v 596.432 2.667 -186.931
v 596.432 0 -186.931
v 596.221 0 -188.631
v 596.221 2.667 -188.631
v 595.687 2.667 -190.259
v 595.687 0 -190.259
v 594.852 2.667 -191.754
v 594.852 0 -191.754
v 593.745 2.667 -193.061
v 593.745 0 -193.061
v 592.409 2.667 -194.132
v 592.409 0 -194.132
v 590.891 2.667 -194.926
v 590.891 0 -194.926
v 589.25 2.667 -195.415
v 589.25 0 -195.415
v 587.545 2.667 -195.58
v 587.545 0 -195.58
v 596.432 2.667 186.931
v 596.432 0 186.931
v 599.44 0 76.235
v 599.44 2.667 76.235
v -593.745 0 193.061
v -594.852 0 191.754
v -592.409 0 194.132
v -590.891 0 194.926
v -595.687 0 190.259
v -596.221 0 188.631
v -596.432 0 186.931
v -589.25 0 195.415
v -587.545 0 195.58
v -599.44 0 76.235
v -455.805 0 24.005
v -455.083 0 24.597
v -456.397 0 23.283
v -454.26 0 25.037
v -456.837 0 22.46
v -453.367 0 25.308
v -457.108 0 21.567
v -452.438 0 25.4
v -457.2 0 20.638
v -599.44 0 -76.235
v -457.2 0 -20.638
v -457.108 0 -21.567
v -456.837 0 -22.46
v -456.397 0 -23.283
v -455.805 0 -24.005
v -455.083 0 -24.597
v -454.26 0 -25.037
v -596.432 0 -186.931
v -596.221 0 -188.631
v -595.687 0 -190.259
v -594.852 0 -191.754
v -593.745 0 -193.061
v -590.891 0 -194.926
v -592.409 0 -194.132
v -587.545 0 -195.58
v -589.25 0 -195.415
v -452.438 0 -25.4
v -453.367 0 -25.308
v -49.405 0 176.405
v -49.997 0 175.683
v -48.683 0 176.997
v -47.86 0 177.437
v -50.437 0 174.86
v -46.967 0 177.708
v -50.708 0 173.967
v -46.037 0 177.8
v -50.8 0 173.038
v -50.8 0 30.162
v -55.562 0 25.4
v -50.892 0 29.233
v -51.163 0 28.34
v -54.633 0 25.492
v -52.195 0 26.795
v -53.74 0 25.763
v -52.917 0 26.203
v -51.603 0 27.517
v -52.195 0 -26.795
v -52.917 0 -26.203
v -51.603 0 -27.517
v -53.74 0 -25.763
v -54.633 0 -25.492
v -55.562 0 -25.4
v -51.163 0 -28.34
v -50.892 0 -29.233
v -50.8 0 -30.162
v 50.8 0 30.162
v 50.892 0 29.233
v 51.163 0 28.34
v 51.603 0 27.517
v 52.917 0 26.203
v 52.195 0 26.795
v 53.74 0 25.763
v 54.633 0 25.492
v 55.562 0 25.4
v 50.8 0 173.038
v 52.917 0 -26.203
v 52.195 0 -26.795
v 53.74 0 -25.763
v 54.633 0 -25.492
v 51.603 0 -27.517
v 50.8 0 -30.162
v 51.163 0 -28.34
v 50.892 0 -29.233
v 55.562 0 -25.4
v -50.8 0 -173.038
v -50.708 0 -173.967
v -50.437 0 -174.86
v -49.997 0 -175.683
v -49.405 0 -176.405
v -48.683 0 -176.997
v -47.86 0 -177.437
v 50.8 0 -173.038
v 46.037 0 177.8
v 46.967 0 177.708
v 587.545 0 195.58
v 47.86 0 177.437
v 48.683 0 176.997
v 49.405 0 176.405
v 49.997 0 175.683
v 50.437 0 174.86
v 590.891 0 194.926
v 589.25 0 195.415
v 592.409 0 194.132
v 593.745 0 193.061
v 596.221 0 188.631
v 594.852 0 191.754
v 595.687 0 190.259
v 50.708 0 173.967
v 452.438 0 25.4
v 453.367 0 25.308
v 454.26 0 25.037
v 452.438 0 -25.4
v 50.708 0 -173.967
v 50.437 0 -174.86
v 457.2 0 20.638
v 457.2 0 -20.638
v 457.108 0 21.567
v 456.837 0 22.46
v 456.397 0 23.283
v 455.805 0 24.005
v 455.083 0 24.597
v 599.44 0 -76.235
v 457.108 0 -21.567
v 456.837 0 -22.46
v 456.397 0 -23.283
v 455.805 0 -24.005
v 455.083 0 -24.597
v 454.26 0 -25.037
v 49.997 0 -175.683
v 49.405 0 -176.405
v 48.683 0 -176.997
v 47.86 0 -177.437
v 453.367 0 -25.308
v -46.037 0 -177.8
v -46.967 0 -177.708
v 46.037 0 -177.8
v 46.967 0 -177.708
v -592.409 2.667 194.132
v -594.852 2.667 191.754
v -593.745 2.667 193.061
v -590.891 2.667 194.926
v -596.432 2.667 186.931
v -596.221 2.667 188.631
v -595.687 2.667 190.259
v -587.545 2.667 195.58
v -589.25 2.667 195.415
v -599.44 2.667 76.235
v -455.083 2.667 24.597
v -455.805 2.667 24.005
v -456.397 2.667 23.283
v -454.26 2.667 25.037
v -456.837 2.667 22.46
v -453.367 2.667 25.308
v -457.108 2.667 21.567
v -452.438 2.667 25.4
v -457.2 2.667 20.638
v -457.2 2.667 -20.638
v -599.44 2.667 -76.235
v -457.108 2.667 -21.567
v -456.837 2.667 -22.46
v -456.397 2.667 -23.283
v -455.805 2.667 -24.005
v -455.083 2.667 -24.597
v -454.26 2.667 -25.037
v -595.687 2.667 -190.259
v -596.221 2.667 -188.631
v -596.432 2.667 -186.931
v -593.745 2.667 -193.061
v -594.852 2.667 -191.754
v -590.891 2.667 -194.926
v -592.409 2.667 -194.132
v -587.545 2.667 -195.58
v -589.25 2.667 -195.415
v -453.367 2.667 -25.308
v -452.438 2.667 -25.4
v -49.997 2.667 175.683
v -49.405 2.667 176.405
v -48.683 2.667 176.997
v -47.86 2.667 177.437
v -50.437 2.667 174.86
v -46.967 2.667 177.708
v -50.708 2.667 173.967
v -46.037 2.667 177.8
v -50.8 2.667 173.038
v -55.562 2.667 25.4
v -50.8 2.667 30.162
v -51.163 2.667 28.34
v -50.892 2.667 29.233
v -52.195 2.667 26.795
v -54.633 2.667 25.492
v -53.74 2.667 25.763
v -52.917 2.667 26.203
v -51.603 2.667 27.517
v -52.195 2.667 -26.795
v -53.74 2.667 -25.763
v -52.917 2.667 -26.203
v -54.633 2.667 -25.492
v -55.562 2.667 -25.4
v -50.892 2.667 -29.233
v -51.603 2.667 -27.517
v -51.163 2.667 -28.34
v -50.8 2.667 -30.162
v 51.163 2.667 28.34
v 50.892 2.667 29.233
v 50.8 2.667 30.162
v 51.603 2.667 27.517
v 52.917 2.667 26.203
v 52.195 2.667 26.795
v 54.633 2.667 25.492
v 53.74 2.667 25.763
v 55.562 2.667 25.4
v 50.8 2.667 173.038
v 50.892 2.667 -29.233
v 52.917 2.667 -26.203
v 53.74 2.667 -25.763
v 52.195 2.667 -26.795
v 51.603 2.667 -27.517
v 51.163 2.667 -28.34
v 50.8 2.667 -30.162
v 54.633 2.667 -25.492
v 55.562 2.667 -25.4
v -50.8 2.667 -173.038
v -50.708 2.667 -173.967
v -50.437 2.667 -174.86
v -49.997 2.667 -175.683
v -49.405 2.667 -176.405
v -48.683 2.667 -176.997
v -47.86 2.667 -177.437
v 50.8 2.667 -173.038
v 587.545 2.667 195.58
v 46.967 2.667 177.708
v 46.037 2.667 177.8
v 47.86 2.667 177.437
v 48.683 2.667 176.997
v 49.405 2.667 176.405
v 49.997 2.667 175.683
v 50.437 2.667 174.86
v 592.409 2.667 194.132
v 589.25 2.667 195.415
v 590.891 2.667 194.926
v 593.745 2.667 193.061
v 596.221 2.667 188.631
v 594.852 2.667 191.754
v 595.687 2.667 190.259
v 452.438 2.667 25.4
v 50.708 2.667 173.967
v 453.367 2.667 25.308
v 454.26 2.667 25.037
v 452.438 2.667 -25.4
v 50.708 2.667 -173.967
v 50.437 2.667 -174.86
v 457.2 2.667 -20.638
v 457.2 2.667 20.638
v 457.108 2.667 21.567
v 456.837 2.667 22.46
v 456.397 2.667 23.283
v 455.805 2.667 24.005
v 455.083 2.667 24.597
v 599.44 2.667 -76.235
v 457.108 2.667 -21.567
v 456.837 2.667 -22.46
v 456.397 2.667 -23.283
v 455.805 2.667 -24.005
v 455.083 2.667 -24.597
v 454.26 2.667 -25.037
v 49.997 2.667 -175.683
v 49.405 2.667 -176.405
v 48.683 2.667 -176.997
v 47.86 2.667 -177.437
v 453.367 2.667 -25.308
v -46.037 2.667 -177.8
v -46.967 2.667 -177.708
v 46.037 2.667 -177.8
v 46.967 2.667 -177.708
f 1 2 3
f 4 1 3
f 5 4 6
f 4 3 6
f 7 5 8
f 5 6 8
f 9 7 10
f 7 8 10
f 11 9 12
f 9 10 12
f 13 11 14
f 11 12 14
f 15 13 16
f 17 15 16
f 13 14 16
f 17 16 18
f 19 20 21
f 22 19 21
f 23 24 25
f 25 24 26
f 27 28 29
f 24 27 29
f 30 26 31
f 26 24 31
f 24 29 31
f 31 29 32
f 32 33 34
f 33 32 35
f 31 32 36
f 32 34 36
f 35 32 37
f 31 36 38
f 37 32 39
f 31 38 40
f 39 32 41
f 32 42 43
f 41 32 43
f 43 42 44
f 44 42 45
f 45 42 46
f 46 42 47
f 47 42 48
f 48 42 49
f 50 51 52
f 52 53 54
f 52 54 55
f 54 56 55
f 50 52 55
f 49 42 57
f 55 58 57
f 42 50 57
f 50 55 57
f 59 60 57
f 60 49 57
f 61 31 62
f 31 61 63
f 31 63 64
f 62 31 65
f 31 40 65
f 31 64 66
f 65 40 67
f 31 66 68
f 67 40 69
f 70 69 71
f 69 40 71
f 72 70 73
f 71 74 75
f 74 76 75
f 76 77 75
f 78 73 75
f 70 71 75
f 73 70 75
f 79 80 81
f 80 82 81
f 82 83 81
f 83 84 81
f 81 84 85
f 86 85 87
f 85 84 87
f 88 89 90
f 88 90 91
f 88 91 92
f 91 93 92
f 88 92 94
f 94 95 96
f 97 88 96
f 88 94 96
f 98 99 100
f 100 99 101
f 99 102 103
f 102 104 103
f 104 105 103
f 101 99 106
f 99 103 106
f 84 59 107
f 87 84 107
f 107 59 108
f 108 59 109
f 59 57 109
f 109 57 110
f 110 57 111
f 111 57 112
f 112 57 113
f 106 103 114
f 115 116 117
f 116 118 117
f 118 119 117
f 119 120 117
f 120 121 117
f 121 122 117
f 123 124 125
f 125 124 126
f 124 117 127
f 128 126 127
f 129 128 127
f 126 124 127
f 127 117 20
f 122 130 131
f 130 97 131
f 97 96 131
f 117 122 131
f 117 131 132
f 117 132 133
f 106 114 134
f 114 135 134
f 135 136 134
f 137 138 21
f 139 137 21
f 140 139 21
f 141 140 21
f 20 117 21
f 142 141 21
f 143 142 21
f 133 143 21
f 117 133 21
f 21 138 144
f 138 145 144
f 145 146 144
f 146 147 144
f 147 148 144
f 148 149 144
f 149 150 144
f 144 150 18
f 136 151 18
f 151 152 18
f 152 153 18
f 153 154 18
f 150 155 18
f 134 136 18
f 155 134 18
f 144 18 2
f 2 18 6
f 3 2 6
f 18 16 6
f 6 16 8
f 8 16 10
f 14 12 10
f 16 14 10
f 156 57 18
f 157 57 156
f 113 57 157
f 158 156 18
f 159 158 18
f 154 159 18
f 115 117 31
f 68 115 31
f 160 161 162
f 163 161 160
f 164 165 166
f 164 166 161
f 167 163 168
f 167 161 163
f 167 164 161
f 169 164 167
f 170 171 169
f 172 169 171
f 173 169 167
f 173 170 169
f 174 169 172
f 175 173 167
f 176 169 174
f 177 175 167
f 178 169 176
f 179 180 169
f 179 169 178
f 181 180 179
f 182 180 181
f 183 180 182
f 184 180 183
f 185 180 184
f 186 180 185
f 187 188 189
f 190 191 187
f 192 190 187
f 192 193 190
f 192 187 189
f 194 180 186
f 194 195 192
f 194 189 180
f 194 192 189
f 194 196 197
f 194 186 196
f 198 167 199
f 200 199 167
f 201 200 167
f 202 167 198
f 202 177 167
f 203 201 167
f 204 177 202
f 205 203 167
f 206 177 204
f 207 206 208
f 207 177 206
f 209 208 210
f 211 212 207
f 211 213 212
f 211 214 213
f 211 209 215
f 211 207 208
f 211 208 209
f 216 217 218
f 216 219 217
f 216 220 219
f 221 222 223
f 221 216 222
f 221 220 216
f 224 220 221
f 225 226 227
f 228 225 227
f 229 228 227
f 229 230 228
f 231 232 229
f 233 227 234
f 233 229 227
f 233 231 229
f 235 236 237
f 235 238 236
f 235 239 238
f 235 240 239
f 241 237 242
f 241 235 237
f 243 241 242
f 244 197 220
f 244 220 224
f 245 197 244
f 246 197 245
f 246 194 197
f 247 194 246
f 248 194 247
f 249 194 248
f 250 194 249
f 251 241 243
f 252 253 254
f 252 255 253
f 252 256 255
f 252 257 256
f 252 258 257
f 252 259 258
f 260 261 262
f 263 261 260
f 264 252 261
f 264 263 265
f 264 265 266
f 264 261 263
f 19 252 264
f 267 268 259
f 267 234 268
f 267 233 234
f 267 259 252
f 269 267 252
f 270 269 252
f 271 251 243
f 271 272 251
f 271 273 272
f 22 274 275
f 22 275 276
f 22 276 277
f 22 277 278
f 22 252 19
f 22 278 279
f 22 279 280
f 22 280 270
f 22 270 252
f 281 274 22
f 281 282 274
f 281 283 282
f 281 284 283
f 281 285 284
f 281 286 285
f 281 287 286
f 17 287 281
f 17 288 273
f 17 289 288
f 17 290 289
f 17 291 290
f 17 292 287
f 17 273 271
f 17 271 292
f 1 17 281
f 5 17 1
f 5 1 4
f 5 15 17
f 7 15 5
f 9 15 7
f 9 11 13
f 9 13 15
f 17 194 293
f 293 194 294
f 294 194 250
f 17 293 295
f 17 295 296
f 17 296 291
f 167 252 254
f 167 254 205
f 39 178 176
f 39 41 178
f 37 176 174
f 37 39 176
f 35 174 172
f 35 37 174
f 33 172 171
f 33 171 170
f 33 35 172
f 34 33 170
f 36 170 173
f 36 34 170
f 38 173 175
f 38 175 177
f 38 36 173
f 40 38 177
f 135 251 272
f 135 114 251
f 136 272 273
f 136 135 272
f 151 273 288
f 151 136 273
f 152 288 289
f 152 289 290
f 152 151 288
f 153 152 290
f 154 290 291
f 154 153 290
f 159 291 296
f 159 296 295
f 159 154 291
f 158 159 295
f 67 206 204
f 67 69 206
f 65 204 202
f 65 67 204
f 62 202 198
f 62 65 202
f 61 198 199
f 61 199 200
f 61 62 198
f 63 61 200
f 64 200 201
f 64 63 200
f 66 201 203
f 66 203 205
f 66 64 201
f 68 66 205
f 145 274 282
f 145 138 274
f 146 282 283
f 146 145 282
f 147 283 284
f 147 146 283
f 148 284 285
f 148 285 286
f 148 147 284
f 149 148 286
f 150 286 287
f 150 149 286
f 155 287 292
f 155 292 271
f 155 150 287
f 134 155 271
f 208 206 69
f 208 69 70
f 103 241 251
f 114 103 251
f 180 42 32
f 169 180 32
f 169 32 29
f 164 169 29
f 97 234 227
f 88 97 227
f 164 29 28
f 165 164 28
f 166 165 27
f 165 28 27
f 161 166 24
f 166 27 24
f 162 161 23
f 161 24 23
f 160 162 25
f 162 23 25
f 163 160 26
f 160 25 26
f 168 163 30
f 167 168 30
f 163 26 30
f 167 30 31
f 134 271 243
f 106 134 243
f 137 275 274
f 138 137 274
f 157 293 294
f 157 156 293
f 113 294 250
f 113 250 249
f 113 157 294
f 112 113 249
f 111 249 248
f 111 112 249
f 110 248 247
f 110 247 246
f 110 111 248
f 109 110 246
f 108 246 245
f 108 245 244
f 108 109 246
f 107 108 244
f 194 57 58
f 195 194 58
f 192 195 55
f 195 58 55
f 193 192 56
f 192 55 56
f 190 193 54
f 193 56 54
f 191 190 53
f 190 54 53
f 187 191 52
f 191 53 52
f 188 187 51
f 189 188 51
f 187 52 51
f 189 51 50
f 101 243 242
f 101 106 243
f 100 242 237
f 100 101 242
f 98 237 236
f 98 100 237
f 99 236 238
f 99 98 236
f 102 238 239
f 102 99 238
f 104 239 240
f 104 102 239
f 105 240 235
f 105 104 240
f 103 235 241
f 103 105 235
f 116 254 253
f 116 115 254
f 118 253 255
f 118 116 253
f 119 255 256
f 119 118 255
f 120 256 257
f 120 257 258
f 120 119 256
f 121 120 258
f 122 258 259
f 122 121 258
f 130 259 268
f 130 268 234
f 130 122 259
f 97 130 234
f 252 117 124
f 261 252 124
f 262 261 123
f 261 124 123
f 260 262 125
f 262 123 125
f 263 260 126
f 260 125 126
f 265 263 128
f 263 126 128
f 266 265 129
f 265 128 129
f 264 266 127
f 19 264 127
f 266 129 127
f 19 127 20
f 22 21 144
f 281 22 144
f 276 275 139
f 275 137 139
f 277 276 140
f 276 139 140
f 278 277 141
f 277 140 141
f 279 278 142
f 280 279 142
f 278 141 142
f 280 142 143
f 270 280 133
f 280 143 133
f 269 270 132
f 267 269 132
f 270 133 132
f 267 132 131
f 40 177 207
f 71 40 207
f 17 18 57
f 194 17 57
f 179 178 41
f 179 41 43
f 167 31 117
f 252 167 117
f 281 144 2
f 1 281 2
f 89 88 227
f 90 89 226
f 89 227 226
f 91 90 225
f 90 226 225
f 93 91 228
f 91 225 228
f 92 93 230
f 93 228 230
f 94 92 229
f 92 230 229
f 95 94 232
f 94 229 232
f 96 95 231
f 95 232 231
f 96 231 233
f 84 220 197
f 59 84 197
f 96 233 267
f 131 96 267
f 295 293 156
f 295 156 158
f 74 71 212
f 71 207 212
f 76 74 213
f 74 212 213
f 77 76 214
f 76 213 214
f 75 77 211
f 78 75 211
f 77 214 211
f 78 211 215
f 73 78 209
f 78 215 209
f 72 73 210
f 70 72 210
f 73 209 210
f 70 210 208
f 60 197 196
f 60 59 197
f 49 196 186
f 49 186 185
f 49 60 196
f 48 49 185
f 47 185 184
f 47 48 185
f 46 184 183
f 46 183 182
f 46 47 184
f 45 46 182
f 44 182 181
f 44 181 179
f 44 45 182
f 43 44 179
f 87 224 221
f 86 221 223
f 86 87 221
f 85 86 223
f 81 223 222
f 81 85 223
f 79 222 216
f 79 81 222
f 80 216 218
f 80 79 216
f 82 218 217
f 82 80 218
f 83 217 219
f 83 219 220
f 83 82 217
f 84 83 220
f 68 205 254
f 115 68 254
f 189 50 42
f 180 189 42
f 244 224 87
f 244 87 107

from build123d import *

# Parameters (mm, degrees)
SKETCH1_W           = 1193.8
SKETCH1_H           = 386.08
BOSS_EXTRUDE1_DEPTH = 2.667
SKETCH2_W           = 457.2
SKETCH2_H           = 50.8
CUT_EXTRUDE1_DEPTH  = 628.344534119
SKETCH3_W           = 101.6
SKETCH3_H           = 355.6
CUT_EXTRUDE2_DEPTH  = 628.344534119
FILLET1_R           = 4.7625
CUT_EXTRUDE3_DEPTH  = 628.344534119
BOSS_EXTRUDE2_START = -2.667
BOSS_EXTRUDE2_DEPTH = 2.667


with BuildPart() as part:
    # Sketch1 → Boss-Extrude1 (new body)
    with BuildSketch(Plane(origin=(0, 0, 0), x_dir=(1, 0, 0), z_dir=(0, 1, 0))):
        Rectangle(SKETCH1_W, SKETCH1_H)
    extrude(amount=BOSS_EXTRUDE1_DEPTH)

    # Sketch2 → Cut-Extrude1 (cut, through all)
    with BuildSketch(Plane(origin=(0, 2.667, 0), x_dir=(1, 0, 0), z_dir=(0, 1, 0))):
        with Locations((228.6, 0)):
            Rectangle(SKETCH2_W, SKETCH2_H)
        with Locations((-228.6, 0)):
            Rectangle(SKETCH2_W, SKETCH2_H)
    extrude(amount=-CUT_EXTRUDE1_DEPTH, mode=Mode.SUBTRACT)

    # Sketch3 → Cut-Extrude2 (cut, through all)
    with BuildSketch(Plane(origin=(0, 2.667, 0), x_dir=(1, 0, 0), z_dir=(0, 1, 0))):
        Rectangle(SKETCH3_W, SKETCH3_H)
    extrude(amount=-CUT_EXTRUDE2_DEPTH, mode=Mode.SUBTRACT)

    # Fillet1
    fillet1_edges = [part.edges().sort_by_distance(p)[0] for p in [
        (457.2, 1.3335, -25.4),
        (457.2, 1.3335, 25.4),
        (-457.2, 1.3335, 25.4),
        (-457.2, 1.3335, -25.4),
        (-50.8, 1.3335, -25.4),
        (50.8, 1.3335, -25.4),
        (50.8, 1.3335, 25.4),
        (-50.8, 1.3335, 25.4),
        (-50.8, 1.3335, 177.8),
        (50.8, 1.3335, -177.8),
        (50.8, 1.3335, 177.8),
        (-50.8, 1.3335, -177.8),
    ]]
    fillet(fillet1_edges, radius=FILLET1_R)

    # Sketch4 → Cut-Extrude3 (cut, through all)
    with BuildSketch(Plane.XZ):
        with BuildLine():
            Line((-593.892867101, -186.862490674), (-596.9, -76.2))
            Line((-596.9, -76.2), (-596.9, -193.04))
            Line((-596.9, -193.04), (-587.545210292, -193.04))
            ThreePointArc((-587.545210292, -193.04), (-591.973933823, -191.240704109), (-593.892867101, -186.862490674))
        make_face()
        with BuildLine():
            Line((-596.9, 76.2), (-593.892867101, 186.862490674))
            ThreePointArc((-593.892867101, 186.862490674), (-591.973933823, 191.240704109), (-587.545210292, 193.04))
            Line((-587.545210292, 193.04), (-596.9, 193.04))
            Line((-596.9, 193.04), (-596.9, 76.2))
        make_face()
        with BuildLine():
            Line((596.9, 193.04), (587.545210292, 193.04))
            ThreePointArc((587.545210292, 193.04), (591.973933823, 191.240704109), (593.892867101, 186.862490674))
            Line((593.892867101, 186.862490674), (596.9, 76.2))
            Line((596.9, 76.2), (596.9, 193.04))
        make_face()
        with BuildLine():
            ThreePointArc((593.892867101, -186.862490674), (591.973933823, -191.240704109), (587.545210292, -193.04))
            Line((587.545210292, -193.04), (596.9, -193.04))
            Line((596.9, -193.04), (596.9, -76.2))
            Line((596.9, -76.2), (593.892867101, -186.862490674))
        make_face()
    extrude(amount=-CUT_EXTRUDE3_DEPTH, mode=Mode.SUBTRACT)

    # Sketch5 → Boss-Extrude2 (add)
    with BuildSketch(Plane(origin=(0, 2.667, 0), x_dir=(1, 0, 0), z_dir=(0, 1, 0)).offset(BOSS_EXTRUDE2_START)):
        with BuildLine():
            Line((587.545210292, 195.58), (-587.545210292, 195.58))
            ThreePointArc((-587.545210292, 195.58), (-593.745423235, 193.060985753), (-596.431929825, 186.931486944))
            Line((-596.431929825, 186.931486944), (-599.44, 76.234504501))
            Line((-599.44, 76.234504501), (-599.44, -76.234504501))
            Line((-599.44, -76.234504501), (-596.431929825, -186.931486944))
            ThreePointArc((-596.431929825, -186.931486944), (-593.745423235, -193.060985753), (-587.545210292, -195.58))
            Line((-587.545210292, -195.58), (587.545210292, -195.58))
            ThreePointArc((587.545210292, -195.58), (593.745423235, -193.060985753), (596.431929825, -186.931486944))
            Line((596.431929825, -186.931486944), (599.44, -76.234504501))
            Line((599.44, -76.234504501), (599.44, 76.234504501))
            Line((599.44, 76.234504501), (596.431929825, 186.931486944))
            ThreePointArc((596.431929825, 186.931486944), (593.745423235, 193.060985753), (587.545210292, 195.58))
        make_face()
        with BuildLine():
            Line((596.9, 76.2), (593.892867101, 186.862490674))
            ThreePointArc((593.892867101, 186.862490674), (591.973933823, 191.240704109), (587.545210292, 193.04))
            Line((587.545210292, 193.04), (-587.545210292, 193.04))
            ThreePointArc((-587.545210292, 193.04), (-591.973933823, 191.240704109), (-593.892867101, 186.862490674))
            Line((-593.892867101, 186.862490674), (-596.9, 76.2))
            Line((-596.9, 76.2), (-596.9, -76.2))
            Line((-596.9, -76.2), (-593.892867101, -186.862490674))
            ThreePointArc((-593.892867101, -186.862490674), (-591.973933823, -191.240704109), (-587.545210292, -193.04))
            Line((-587.545210292, -193.04), (587.545210292, -193.04))
            ThreePointArc((587.545210292, -193.04), (591.973933823, -191.240704109), (593.892867101, -186.862490674))
            Line((593.892867101, -186.862490674), (596.9, -76.2))
            Line((596.9, -76.2), (596.9, 76.2))
        make_face(mode=Mode.SUBTRACT)
    extrude(amount=BOSS_EXTRUDE2_DEPTH)


solid = part.part
